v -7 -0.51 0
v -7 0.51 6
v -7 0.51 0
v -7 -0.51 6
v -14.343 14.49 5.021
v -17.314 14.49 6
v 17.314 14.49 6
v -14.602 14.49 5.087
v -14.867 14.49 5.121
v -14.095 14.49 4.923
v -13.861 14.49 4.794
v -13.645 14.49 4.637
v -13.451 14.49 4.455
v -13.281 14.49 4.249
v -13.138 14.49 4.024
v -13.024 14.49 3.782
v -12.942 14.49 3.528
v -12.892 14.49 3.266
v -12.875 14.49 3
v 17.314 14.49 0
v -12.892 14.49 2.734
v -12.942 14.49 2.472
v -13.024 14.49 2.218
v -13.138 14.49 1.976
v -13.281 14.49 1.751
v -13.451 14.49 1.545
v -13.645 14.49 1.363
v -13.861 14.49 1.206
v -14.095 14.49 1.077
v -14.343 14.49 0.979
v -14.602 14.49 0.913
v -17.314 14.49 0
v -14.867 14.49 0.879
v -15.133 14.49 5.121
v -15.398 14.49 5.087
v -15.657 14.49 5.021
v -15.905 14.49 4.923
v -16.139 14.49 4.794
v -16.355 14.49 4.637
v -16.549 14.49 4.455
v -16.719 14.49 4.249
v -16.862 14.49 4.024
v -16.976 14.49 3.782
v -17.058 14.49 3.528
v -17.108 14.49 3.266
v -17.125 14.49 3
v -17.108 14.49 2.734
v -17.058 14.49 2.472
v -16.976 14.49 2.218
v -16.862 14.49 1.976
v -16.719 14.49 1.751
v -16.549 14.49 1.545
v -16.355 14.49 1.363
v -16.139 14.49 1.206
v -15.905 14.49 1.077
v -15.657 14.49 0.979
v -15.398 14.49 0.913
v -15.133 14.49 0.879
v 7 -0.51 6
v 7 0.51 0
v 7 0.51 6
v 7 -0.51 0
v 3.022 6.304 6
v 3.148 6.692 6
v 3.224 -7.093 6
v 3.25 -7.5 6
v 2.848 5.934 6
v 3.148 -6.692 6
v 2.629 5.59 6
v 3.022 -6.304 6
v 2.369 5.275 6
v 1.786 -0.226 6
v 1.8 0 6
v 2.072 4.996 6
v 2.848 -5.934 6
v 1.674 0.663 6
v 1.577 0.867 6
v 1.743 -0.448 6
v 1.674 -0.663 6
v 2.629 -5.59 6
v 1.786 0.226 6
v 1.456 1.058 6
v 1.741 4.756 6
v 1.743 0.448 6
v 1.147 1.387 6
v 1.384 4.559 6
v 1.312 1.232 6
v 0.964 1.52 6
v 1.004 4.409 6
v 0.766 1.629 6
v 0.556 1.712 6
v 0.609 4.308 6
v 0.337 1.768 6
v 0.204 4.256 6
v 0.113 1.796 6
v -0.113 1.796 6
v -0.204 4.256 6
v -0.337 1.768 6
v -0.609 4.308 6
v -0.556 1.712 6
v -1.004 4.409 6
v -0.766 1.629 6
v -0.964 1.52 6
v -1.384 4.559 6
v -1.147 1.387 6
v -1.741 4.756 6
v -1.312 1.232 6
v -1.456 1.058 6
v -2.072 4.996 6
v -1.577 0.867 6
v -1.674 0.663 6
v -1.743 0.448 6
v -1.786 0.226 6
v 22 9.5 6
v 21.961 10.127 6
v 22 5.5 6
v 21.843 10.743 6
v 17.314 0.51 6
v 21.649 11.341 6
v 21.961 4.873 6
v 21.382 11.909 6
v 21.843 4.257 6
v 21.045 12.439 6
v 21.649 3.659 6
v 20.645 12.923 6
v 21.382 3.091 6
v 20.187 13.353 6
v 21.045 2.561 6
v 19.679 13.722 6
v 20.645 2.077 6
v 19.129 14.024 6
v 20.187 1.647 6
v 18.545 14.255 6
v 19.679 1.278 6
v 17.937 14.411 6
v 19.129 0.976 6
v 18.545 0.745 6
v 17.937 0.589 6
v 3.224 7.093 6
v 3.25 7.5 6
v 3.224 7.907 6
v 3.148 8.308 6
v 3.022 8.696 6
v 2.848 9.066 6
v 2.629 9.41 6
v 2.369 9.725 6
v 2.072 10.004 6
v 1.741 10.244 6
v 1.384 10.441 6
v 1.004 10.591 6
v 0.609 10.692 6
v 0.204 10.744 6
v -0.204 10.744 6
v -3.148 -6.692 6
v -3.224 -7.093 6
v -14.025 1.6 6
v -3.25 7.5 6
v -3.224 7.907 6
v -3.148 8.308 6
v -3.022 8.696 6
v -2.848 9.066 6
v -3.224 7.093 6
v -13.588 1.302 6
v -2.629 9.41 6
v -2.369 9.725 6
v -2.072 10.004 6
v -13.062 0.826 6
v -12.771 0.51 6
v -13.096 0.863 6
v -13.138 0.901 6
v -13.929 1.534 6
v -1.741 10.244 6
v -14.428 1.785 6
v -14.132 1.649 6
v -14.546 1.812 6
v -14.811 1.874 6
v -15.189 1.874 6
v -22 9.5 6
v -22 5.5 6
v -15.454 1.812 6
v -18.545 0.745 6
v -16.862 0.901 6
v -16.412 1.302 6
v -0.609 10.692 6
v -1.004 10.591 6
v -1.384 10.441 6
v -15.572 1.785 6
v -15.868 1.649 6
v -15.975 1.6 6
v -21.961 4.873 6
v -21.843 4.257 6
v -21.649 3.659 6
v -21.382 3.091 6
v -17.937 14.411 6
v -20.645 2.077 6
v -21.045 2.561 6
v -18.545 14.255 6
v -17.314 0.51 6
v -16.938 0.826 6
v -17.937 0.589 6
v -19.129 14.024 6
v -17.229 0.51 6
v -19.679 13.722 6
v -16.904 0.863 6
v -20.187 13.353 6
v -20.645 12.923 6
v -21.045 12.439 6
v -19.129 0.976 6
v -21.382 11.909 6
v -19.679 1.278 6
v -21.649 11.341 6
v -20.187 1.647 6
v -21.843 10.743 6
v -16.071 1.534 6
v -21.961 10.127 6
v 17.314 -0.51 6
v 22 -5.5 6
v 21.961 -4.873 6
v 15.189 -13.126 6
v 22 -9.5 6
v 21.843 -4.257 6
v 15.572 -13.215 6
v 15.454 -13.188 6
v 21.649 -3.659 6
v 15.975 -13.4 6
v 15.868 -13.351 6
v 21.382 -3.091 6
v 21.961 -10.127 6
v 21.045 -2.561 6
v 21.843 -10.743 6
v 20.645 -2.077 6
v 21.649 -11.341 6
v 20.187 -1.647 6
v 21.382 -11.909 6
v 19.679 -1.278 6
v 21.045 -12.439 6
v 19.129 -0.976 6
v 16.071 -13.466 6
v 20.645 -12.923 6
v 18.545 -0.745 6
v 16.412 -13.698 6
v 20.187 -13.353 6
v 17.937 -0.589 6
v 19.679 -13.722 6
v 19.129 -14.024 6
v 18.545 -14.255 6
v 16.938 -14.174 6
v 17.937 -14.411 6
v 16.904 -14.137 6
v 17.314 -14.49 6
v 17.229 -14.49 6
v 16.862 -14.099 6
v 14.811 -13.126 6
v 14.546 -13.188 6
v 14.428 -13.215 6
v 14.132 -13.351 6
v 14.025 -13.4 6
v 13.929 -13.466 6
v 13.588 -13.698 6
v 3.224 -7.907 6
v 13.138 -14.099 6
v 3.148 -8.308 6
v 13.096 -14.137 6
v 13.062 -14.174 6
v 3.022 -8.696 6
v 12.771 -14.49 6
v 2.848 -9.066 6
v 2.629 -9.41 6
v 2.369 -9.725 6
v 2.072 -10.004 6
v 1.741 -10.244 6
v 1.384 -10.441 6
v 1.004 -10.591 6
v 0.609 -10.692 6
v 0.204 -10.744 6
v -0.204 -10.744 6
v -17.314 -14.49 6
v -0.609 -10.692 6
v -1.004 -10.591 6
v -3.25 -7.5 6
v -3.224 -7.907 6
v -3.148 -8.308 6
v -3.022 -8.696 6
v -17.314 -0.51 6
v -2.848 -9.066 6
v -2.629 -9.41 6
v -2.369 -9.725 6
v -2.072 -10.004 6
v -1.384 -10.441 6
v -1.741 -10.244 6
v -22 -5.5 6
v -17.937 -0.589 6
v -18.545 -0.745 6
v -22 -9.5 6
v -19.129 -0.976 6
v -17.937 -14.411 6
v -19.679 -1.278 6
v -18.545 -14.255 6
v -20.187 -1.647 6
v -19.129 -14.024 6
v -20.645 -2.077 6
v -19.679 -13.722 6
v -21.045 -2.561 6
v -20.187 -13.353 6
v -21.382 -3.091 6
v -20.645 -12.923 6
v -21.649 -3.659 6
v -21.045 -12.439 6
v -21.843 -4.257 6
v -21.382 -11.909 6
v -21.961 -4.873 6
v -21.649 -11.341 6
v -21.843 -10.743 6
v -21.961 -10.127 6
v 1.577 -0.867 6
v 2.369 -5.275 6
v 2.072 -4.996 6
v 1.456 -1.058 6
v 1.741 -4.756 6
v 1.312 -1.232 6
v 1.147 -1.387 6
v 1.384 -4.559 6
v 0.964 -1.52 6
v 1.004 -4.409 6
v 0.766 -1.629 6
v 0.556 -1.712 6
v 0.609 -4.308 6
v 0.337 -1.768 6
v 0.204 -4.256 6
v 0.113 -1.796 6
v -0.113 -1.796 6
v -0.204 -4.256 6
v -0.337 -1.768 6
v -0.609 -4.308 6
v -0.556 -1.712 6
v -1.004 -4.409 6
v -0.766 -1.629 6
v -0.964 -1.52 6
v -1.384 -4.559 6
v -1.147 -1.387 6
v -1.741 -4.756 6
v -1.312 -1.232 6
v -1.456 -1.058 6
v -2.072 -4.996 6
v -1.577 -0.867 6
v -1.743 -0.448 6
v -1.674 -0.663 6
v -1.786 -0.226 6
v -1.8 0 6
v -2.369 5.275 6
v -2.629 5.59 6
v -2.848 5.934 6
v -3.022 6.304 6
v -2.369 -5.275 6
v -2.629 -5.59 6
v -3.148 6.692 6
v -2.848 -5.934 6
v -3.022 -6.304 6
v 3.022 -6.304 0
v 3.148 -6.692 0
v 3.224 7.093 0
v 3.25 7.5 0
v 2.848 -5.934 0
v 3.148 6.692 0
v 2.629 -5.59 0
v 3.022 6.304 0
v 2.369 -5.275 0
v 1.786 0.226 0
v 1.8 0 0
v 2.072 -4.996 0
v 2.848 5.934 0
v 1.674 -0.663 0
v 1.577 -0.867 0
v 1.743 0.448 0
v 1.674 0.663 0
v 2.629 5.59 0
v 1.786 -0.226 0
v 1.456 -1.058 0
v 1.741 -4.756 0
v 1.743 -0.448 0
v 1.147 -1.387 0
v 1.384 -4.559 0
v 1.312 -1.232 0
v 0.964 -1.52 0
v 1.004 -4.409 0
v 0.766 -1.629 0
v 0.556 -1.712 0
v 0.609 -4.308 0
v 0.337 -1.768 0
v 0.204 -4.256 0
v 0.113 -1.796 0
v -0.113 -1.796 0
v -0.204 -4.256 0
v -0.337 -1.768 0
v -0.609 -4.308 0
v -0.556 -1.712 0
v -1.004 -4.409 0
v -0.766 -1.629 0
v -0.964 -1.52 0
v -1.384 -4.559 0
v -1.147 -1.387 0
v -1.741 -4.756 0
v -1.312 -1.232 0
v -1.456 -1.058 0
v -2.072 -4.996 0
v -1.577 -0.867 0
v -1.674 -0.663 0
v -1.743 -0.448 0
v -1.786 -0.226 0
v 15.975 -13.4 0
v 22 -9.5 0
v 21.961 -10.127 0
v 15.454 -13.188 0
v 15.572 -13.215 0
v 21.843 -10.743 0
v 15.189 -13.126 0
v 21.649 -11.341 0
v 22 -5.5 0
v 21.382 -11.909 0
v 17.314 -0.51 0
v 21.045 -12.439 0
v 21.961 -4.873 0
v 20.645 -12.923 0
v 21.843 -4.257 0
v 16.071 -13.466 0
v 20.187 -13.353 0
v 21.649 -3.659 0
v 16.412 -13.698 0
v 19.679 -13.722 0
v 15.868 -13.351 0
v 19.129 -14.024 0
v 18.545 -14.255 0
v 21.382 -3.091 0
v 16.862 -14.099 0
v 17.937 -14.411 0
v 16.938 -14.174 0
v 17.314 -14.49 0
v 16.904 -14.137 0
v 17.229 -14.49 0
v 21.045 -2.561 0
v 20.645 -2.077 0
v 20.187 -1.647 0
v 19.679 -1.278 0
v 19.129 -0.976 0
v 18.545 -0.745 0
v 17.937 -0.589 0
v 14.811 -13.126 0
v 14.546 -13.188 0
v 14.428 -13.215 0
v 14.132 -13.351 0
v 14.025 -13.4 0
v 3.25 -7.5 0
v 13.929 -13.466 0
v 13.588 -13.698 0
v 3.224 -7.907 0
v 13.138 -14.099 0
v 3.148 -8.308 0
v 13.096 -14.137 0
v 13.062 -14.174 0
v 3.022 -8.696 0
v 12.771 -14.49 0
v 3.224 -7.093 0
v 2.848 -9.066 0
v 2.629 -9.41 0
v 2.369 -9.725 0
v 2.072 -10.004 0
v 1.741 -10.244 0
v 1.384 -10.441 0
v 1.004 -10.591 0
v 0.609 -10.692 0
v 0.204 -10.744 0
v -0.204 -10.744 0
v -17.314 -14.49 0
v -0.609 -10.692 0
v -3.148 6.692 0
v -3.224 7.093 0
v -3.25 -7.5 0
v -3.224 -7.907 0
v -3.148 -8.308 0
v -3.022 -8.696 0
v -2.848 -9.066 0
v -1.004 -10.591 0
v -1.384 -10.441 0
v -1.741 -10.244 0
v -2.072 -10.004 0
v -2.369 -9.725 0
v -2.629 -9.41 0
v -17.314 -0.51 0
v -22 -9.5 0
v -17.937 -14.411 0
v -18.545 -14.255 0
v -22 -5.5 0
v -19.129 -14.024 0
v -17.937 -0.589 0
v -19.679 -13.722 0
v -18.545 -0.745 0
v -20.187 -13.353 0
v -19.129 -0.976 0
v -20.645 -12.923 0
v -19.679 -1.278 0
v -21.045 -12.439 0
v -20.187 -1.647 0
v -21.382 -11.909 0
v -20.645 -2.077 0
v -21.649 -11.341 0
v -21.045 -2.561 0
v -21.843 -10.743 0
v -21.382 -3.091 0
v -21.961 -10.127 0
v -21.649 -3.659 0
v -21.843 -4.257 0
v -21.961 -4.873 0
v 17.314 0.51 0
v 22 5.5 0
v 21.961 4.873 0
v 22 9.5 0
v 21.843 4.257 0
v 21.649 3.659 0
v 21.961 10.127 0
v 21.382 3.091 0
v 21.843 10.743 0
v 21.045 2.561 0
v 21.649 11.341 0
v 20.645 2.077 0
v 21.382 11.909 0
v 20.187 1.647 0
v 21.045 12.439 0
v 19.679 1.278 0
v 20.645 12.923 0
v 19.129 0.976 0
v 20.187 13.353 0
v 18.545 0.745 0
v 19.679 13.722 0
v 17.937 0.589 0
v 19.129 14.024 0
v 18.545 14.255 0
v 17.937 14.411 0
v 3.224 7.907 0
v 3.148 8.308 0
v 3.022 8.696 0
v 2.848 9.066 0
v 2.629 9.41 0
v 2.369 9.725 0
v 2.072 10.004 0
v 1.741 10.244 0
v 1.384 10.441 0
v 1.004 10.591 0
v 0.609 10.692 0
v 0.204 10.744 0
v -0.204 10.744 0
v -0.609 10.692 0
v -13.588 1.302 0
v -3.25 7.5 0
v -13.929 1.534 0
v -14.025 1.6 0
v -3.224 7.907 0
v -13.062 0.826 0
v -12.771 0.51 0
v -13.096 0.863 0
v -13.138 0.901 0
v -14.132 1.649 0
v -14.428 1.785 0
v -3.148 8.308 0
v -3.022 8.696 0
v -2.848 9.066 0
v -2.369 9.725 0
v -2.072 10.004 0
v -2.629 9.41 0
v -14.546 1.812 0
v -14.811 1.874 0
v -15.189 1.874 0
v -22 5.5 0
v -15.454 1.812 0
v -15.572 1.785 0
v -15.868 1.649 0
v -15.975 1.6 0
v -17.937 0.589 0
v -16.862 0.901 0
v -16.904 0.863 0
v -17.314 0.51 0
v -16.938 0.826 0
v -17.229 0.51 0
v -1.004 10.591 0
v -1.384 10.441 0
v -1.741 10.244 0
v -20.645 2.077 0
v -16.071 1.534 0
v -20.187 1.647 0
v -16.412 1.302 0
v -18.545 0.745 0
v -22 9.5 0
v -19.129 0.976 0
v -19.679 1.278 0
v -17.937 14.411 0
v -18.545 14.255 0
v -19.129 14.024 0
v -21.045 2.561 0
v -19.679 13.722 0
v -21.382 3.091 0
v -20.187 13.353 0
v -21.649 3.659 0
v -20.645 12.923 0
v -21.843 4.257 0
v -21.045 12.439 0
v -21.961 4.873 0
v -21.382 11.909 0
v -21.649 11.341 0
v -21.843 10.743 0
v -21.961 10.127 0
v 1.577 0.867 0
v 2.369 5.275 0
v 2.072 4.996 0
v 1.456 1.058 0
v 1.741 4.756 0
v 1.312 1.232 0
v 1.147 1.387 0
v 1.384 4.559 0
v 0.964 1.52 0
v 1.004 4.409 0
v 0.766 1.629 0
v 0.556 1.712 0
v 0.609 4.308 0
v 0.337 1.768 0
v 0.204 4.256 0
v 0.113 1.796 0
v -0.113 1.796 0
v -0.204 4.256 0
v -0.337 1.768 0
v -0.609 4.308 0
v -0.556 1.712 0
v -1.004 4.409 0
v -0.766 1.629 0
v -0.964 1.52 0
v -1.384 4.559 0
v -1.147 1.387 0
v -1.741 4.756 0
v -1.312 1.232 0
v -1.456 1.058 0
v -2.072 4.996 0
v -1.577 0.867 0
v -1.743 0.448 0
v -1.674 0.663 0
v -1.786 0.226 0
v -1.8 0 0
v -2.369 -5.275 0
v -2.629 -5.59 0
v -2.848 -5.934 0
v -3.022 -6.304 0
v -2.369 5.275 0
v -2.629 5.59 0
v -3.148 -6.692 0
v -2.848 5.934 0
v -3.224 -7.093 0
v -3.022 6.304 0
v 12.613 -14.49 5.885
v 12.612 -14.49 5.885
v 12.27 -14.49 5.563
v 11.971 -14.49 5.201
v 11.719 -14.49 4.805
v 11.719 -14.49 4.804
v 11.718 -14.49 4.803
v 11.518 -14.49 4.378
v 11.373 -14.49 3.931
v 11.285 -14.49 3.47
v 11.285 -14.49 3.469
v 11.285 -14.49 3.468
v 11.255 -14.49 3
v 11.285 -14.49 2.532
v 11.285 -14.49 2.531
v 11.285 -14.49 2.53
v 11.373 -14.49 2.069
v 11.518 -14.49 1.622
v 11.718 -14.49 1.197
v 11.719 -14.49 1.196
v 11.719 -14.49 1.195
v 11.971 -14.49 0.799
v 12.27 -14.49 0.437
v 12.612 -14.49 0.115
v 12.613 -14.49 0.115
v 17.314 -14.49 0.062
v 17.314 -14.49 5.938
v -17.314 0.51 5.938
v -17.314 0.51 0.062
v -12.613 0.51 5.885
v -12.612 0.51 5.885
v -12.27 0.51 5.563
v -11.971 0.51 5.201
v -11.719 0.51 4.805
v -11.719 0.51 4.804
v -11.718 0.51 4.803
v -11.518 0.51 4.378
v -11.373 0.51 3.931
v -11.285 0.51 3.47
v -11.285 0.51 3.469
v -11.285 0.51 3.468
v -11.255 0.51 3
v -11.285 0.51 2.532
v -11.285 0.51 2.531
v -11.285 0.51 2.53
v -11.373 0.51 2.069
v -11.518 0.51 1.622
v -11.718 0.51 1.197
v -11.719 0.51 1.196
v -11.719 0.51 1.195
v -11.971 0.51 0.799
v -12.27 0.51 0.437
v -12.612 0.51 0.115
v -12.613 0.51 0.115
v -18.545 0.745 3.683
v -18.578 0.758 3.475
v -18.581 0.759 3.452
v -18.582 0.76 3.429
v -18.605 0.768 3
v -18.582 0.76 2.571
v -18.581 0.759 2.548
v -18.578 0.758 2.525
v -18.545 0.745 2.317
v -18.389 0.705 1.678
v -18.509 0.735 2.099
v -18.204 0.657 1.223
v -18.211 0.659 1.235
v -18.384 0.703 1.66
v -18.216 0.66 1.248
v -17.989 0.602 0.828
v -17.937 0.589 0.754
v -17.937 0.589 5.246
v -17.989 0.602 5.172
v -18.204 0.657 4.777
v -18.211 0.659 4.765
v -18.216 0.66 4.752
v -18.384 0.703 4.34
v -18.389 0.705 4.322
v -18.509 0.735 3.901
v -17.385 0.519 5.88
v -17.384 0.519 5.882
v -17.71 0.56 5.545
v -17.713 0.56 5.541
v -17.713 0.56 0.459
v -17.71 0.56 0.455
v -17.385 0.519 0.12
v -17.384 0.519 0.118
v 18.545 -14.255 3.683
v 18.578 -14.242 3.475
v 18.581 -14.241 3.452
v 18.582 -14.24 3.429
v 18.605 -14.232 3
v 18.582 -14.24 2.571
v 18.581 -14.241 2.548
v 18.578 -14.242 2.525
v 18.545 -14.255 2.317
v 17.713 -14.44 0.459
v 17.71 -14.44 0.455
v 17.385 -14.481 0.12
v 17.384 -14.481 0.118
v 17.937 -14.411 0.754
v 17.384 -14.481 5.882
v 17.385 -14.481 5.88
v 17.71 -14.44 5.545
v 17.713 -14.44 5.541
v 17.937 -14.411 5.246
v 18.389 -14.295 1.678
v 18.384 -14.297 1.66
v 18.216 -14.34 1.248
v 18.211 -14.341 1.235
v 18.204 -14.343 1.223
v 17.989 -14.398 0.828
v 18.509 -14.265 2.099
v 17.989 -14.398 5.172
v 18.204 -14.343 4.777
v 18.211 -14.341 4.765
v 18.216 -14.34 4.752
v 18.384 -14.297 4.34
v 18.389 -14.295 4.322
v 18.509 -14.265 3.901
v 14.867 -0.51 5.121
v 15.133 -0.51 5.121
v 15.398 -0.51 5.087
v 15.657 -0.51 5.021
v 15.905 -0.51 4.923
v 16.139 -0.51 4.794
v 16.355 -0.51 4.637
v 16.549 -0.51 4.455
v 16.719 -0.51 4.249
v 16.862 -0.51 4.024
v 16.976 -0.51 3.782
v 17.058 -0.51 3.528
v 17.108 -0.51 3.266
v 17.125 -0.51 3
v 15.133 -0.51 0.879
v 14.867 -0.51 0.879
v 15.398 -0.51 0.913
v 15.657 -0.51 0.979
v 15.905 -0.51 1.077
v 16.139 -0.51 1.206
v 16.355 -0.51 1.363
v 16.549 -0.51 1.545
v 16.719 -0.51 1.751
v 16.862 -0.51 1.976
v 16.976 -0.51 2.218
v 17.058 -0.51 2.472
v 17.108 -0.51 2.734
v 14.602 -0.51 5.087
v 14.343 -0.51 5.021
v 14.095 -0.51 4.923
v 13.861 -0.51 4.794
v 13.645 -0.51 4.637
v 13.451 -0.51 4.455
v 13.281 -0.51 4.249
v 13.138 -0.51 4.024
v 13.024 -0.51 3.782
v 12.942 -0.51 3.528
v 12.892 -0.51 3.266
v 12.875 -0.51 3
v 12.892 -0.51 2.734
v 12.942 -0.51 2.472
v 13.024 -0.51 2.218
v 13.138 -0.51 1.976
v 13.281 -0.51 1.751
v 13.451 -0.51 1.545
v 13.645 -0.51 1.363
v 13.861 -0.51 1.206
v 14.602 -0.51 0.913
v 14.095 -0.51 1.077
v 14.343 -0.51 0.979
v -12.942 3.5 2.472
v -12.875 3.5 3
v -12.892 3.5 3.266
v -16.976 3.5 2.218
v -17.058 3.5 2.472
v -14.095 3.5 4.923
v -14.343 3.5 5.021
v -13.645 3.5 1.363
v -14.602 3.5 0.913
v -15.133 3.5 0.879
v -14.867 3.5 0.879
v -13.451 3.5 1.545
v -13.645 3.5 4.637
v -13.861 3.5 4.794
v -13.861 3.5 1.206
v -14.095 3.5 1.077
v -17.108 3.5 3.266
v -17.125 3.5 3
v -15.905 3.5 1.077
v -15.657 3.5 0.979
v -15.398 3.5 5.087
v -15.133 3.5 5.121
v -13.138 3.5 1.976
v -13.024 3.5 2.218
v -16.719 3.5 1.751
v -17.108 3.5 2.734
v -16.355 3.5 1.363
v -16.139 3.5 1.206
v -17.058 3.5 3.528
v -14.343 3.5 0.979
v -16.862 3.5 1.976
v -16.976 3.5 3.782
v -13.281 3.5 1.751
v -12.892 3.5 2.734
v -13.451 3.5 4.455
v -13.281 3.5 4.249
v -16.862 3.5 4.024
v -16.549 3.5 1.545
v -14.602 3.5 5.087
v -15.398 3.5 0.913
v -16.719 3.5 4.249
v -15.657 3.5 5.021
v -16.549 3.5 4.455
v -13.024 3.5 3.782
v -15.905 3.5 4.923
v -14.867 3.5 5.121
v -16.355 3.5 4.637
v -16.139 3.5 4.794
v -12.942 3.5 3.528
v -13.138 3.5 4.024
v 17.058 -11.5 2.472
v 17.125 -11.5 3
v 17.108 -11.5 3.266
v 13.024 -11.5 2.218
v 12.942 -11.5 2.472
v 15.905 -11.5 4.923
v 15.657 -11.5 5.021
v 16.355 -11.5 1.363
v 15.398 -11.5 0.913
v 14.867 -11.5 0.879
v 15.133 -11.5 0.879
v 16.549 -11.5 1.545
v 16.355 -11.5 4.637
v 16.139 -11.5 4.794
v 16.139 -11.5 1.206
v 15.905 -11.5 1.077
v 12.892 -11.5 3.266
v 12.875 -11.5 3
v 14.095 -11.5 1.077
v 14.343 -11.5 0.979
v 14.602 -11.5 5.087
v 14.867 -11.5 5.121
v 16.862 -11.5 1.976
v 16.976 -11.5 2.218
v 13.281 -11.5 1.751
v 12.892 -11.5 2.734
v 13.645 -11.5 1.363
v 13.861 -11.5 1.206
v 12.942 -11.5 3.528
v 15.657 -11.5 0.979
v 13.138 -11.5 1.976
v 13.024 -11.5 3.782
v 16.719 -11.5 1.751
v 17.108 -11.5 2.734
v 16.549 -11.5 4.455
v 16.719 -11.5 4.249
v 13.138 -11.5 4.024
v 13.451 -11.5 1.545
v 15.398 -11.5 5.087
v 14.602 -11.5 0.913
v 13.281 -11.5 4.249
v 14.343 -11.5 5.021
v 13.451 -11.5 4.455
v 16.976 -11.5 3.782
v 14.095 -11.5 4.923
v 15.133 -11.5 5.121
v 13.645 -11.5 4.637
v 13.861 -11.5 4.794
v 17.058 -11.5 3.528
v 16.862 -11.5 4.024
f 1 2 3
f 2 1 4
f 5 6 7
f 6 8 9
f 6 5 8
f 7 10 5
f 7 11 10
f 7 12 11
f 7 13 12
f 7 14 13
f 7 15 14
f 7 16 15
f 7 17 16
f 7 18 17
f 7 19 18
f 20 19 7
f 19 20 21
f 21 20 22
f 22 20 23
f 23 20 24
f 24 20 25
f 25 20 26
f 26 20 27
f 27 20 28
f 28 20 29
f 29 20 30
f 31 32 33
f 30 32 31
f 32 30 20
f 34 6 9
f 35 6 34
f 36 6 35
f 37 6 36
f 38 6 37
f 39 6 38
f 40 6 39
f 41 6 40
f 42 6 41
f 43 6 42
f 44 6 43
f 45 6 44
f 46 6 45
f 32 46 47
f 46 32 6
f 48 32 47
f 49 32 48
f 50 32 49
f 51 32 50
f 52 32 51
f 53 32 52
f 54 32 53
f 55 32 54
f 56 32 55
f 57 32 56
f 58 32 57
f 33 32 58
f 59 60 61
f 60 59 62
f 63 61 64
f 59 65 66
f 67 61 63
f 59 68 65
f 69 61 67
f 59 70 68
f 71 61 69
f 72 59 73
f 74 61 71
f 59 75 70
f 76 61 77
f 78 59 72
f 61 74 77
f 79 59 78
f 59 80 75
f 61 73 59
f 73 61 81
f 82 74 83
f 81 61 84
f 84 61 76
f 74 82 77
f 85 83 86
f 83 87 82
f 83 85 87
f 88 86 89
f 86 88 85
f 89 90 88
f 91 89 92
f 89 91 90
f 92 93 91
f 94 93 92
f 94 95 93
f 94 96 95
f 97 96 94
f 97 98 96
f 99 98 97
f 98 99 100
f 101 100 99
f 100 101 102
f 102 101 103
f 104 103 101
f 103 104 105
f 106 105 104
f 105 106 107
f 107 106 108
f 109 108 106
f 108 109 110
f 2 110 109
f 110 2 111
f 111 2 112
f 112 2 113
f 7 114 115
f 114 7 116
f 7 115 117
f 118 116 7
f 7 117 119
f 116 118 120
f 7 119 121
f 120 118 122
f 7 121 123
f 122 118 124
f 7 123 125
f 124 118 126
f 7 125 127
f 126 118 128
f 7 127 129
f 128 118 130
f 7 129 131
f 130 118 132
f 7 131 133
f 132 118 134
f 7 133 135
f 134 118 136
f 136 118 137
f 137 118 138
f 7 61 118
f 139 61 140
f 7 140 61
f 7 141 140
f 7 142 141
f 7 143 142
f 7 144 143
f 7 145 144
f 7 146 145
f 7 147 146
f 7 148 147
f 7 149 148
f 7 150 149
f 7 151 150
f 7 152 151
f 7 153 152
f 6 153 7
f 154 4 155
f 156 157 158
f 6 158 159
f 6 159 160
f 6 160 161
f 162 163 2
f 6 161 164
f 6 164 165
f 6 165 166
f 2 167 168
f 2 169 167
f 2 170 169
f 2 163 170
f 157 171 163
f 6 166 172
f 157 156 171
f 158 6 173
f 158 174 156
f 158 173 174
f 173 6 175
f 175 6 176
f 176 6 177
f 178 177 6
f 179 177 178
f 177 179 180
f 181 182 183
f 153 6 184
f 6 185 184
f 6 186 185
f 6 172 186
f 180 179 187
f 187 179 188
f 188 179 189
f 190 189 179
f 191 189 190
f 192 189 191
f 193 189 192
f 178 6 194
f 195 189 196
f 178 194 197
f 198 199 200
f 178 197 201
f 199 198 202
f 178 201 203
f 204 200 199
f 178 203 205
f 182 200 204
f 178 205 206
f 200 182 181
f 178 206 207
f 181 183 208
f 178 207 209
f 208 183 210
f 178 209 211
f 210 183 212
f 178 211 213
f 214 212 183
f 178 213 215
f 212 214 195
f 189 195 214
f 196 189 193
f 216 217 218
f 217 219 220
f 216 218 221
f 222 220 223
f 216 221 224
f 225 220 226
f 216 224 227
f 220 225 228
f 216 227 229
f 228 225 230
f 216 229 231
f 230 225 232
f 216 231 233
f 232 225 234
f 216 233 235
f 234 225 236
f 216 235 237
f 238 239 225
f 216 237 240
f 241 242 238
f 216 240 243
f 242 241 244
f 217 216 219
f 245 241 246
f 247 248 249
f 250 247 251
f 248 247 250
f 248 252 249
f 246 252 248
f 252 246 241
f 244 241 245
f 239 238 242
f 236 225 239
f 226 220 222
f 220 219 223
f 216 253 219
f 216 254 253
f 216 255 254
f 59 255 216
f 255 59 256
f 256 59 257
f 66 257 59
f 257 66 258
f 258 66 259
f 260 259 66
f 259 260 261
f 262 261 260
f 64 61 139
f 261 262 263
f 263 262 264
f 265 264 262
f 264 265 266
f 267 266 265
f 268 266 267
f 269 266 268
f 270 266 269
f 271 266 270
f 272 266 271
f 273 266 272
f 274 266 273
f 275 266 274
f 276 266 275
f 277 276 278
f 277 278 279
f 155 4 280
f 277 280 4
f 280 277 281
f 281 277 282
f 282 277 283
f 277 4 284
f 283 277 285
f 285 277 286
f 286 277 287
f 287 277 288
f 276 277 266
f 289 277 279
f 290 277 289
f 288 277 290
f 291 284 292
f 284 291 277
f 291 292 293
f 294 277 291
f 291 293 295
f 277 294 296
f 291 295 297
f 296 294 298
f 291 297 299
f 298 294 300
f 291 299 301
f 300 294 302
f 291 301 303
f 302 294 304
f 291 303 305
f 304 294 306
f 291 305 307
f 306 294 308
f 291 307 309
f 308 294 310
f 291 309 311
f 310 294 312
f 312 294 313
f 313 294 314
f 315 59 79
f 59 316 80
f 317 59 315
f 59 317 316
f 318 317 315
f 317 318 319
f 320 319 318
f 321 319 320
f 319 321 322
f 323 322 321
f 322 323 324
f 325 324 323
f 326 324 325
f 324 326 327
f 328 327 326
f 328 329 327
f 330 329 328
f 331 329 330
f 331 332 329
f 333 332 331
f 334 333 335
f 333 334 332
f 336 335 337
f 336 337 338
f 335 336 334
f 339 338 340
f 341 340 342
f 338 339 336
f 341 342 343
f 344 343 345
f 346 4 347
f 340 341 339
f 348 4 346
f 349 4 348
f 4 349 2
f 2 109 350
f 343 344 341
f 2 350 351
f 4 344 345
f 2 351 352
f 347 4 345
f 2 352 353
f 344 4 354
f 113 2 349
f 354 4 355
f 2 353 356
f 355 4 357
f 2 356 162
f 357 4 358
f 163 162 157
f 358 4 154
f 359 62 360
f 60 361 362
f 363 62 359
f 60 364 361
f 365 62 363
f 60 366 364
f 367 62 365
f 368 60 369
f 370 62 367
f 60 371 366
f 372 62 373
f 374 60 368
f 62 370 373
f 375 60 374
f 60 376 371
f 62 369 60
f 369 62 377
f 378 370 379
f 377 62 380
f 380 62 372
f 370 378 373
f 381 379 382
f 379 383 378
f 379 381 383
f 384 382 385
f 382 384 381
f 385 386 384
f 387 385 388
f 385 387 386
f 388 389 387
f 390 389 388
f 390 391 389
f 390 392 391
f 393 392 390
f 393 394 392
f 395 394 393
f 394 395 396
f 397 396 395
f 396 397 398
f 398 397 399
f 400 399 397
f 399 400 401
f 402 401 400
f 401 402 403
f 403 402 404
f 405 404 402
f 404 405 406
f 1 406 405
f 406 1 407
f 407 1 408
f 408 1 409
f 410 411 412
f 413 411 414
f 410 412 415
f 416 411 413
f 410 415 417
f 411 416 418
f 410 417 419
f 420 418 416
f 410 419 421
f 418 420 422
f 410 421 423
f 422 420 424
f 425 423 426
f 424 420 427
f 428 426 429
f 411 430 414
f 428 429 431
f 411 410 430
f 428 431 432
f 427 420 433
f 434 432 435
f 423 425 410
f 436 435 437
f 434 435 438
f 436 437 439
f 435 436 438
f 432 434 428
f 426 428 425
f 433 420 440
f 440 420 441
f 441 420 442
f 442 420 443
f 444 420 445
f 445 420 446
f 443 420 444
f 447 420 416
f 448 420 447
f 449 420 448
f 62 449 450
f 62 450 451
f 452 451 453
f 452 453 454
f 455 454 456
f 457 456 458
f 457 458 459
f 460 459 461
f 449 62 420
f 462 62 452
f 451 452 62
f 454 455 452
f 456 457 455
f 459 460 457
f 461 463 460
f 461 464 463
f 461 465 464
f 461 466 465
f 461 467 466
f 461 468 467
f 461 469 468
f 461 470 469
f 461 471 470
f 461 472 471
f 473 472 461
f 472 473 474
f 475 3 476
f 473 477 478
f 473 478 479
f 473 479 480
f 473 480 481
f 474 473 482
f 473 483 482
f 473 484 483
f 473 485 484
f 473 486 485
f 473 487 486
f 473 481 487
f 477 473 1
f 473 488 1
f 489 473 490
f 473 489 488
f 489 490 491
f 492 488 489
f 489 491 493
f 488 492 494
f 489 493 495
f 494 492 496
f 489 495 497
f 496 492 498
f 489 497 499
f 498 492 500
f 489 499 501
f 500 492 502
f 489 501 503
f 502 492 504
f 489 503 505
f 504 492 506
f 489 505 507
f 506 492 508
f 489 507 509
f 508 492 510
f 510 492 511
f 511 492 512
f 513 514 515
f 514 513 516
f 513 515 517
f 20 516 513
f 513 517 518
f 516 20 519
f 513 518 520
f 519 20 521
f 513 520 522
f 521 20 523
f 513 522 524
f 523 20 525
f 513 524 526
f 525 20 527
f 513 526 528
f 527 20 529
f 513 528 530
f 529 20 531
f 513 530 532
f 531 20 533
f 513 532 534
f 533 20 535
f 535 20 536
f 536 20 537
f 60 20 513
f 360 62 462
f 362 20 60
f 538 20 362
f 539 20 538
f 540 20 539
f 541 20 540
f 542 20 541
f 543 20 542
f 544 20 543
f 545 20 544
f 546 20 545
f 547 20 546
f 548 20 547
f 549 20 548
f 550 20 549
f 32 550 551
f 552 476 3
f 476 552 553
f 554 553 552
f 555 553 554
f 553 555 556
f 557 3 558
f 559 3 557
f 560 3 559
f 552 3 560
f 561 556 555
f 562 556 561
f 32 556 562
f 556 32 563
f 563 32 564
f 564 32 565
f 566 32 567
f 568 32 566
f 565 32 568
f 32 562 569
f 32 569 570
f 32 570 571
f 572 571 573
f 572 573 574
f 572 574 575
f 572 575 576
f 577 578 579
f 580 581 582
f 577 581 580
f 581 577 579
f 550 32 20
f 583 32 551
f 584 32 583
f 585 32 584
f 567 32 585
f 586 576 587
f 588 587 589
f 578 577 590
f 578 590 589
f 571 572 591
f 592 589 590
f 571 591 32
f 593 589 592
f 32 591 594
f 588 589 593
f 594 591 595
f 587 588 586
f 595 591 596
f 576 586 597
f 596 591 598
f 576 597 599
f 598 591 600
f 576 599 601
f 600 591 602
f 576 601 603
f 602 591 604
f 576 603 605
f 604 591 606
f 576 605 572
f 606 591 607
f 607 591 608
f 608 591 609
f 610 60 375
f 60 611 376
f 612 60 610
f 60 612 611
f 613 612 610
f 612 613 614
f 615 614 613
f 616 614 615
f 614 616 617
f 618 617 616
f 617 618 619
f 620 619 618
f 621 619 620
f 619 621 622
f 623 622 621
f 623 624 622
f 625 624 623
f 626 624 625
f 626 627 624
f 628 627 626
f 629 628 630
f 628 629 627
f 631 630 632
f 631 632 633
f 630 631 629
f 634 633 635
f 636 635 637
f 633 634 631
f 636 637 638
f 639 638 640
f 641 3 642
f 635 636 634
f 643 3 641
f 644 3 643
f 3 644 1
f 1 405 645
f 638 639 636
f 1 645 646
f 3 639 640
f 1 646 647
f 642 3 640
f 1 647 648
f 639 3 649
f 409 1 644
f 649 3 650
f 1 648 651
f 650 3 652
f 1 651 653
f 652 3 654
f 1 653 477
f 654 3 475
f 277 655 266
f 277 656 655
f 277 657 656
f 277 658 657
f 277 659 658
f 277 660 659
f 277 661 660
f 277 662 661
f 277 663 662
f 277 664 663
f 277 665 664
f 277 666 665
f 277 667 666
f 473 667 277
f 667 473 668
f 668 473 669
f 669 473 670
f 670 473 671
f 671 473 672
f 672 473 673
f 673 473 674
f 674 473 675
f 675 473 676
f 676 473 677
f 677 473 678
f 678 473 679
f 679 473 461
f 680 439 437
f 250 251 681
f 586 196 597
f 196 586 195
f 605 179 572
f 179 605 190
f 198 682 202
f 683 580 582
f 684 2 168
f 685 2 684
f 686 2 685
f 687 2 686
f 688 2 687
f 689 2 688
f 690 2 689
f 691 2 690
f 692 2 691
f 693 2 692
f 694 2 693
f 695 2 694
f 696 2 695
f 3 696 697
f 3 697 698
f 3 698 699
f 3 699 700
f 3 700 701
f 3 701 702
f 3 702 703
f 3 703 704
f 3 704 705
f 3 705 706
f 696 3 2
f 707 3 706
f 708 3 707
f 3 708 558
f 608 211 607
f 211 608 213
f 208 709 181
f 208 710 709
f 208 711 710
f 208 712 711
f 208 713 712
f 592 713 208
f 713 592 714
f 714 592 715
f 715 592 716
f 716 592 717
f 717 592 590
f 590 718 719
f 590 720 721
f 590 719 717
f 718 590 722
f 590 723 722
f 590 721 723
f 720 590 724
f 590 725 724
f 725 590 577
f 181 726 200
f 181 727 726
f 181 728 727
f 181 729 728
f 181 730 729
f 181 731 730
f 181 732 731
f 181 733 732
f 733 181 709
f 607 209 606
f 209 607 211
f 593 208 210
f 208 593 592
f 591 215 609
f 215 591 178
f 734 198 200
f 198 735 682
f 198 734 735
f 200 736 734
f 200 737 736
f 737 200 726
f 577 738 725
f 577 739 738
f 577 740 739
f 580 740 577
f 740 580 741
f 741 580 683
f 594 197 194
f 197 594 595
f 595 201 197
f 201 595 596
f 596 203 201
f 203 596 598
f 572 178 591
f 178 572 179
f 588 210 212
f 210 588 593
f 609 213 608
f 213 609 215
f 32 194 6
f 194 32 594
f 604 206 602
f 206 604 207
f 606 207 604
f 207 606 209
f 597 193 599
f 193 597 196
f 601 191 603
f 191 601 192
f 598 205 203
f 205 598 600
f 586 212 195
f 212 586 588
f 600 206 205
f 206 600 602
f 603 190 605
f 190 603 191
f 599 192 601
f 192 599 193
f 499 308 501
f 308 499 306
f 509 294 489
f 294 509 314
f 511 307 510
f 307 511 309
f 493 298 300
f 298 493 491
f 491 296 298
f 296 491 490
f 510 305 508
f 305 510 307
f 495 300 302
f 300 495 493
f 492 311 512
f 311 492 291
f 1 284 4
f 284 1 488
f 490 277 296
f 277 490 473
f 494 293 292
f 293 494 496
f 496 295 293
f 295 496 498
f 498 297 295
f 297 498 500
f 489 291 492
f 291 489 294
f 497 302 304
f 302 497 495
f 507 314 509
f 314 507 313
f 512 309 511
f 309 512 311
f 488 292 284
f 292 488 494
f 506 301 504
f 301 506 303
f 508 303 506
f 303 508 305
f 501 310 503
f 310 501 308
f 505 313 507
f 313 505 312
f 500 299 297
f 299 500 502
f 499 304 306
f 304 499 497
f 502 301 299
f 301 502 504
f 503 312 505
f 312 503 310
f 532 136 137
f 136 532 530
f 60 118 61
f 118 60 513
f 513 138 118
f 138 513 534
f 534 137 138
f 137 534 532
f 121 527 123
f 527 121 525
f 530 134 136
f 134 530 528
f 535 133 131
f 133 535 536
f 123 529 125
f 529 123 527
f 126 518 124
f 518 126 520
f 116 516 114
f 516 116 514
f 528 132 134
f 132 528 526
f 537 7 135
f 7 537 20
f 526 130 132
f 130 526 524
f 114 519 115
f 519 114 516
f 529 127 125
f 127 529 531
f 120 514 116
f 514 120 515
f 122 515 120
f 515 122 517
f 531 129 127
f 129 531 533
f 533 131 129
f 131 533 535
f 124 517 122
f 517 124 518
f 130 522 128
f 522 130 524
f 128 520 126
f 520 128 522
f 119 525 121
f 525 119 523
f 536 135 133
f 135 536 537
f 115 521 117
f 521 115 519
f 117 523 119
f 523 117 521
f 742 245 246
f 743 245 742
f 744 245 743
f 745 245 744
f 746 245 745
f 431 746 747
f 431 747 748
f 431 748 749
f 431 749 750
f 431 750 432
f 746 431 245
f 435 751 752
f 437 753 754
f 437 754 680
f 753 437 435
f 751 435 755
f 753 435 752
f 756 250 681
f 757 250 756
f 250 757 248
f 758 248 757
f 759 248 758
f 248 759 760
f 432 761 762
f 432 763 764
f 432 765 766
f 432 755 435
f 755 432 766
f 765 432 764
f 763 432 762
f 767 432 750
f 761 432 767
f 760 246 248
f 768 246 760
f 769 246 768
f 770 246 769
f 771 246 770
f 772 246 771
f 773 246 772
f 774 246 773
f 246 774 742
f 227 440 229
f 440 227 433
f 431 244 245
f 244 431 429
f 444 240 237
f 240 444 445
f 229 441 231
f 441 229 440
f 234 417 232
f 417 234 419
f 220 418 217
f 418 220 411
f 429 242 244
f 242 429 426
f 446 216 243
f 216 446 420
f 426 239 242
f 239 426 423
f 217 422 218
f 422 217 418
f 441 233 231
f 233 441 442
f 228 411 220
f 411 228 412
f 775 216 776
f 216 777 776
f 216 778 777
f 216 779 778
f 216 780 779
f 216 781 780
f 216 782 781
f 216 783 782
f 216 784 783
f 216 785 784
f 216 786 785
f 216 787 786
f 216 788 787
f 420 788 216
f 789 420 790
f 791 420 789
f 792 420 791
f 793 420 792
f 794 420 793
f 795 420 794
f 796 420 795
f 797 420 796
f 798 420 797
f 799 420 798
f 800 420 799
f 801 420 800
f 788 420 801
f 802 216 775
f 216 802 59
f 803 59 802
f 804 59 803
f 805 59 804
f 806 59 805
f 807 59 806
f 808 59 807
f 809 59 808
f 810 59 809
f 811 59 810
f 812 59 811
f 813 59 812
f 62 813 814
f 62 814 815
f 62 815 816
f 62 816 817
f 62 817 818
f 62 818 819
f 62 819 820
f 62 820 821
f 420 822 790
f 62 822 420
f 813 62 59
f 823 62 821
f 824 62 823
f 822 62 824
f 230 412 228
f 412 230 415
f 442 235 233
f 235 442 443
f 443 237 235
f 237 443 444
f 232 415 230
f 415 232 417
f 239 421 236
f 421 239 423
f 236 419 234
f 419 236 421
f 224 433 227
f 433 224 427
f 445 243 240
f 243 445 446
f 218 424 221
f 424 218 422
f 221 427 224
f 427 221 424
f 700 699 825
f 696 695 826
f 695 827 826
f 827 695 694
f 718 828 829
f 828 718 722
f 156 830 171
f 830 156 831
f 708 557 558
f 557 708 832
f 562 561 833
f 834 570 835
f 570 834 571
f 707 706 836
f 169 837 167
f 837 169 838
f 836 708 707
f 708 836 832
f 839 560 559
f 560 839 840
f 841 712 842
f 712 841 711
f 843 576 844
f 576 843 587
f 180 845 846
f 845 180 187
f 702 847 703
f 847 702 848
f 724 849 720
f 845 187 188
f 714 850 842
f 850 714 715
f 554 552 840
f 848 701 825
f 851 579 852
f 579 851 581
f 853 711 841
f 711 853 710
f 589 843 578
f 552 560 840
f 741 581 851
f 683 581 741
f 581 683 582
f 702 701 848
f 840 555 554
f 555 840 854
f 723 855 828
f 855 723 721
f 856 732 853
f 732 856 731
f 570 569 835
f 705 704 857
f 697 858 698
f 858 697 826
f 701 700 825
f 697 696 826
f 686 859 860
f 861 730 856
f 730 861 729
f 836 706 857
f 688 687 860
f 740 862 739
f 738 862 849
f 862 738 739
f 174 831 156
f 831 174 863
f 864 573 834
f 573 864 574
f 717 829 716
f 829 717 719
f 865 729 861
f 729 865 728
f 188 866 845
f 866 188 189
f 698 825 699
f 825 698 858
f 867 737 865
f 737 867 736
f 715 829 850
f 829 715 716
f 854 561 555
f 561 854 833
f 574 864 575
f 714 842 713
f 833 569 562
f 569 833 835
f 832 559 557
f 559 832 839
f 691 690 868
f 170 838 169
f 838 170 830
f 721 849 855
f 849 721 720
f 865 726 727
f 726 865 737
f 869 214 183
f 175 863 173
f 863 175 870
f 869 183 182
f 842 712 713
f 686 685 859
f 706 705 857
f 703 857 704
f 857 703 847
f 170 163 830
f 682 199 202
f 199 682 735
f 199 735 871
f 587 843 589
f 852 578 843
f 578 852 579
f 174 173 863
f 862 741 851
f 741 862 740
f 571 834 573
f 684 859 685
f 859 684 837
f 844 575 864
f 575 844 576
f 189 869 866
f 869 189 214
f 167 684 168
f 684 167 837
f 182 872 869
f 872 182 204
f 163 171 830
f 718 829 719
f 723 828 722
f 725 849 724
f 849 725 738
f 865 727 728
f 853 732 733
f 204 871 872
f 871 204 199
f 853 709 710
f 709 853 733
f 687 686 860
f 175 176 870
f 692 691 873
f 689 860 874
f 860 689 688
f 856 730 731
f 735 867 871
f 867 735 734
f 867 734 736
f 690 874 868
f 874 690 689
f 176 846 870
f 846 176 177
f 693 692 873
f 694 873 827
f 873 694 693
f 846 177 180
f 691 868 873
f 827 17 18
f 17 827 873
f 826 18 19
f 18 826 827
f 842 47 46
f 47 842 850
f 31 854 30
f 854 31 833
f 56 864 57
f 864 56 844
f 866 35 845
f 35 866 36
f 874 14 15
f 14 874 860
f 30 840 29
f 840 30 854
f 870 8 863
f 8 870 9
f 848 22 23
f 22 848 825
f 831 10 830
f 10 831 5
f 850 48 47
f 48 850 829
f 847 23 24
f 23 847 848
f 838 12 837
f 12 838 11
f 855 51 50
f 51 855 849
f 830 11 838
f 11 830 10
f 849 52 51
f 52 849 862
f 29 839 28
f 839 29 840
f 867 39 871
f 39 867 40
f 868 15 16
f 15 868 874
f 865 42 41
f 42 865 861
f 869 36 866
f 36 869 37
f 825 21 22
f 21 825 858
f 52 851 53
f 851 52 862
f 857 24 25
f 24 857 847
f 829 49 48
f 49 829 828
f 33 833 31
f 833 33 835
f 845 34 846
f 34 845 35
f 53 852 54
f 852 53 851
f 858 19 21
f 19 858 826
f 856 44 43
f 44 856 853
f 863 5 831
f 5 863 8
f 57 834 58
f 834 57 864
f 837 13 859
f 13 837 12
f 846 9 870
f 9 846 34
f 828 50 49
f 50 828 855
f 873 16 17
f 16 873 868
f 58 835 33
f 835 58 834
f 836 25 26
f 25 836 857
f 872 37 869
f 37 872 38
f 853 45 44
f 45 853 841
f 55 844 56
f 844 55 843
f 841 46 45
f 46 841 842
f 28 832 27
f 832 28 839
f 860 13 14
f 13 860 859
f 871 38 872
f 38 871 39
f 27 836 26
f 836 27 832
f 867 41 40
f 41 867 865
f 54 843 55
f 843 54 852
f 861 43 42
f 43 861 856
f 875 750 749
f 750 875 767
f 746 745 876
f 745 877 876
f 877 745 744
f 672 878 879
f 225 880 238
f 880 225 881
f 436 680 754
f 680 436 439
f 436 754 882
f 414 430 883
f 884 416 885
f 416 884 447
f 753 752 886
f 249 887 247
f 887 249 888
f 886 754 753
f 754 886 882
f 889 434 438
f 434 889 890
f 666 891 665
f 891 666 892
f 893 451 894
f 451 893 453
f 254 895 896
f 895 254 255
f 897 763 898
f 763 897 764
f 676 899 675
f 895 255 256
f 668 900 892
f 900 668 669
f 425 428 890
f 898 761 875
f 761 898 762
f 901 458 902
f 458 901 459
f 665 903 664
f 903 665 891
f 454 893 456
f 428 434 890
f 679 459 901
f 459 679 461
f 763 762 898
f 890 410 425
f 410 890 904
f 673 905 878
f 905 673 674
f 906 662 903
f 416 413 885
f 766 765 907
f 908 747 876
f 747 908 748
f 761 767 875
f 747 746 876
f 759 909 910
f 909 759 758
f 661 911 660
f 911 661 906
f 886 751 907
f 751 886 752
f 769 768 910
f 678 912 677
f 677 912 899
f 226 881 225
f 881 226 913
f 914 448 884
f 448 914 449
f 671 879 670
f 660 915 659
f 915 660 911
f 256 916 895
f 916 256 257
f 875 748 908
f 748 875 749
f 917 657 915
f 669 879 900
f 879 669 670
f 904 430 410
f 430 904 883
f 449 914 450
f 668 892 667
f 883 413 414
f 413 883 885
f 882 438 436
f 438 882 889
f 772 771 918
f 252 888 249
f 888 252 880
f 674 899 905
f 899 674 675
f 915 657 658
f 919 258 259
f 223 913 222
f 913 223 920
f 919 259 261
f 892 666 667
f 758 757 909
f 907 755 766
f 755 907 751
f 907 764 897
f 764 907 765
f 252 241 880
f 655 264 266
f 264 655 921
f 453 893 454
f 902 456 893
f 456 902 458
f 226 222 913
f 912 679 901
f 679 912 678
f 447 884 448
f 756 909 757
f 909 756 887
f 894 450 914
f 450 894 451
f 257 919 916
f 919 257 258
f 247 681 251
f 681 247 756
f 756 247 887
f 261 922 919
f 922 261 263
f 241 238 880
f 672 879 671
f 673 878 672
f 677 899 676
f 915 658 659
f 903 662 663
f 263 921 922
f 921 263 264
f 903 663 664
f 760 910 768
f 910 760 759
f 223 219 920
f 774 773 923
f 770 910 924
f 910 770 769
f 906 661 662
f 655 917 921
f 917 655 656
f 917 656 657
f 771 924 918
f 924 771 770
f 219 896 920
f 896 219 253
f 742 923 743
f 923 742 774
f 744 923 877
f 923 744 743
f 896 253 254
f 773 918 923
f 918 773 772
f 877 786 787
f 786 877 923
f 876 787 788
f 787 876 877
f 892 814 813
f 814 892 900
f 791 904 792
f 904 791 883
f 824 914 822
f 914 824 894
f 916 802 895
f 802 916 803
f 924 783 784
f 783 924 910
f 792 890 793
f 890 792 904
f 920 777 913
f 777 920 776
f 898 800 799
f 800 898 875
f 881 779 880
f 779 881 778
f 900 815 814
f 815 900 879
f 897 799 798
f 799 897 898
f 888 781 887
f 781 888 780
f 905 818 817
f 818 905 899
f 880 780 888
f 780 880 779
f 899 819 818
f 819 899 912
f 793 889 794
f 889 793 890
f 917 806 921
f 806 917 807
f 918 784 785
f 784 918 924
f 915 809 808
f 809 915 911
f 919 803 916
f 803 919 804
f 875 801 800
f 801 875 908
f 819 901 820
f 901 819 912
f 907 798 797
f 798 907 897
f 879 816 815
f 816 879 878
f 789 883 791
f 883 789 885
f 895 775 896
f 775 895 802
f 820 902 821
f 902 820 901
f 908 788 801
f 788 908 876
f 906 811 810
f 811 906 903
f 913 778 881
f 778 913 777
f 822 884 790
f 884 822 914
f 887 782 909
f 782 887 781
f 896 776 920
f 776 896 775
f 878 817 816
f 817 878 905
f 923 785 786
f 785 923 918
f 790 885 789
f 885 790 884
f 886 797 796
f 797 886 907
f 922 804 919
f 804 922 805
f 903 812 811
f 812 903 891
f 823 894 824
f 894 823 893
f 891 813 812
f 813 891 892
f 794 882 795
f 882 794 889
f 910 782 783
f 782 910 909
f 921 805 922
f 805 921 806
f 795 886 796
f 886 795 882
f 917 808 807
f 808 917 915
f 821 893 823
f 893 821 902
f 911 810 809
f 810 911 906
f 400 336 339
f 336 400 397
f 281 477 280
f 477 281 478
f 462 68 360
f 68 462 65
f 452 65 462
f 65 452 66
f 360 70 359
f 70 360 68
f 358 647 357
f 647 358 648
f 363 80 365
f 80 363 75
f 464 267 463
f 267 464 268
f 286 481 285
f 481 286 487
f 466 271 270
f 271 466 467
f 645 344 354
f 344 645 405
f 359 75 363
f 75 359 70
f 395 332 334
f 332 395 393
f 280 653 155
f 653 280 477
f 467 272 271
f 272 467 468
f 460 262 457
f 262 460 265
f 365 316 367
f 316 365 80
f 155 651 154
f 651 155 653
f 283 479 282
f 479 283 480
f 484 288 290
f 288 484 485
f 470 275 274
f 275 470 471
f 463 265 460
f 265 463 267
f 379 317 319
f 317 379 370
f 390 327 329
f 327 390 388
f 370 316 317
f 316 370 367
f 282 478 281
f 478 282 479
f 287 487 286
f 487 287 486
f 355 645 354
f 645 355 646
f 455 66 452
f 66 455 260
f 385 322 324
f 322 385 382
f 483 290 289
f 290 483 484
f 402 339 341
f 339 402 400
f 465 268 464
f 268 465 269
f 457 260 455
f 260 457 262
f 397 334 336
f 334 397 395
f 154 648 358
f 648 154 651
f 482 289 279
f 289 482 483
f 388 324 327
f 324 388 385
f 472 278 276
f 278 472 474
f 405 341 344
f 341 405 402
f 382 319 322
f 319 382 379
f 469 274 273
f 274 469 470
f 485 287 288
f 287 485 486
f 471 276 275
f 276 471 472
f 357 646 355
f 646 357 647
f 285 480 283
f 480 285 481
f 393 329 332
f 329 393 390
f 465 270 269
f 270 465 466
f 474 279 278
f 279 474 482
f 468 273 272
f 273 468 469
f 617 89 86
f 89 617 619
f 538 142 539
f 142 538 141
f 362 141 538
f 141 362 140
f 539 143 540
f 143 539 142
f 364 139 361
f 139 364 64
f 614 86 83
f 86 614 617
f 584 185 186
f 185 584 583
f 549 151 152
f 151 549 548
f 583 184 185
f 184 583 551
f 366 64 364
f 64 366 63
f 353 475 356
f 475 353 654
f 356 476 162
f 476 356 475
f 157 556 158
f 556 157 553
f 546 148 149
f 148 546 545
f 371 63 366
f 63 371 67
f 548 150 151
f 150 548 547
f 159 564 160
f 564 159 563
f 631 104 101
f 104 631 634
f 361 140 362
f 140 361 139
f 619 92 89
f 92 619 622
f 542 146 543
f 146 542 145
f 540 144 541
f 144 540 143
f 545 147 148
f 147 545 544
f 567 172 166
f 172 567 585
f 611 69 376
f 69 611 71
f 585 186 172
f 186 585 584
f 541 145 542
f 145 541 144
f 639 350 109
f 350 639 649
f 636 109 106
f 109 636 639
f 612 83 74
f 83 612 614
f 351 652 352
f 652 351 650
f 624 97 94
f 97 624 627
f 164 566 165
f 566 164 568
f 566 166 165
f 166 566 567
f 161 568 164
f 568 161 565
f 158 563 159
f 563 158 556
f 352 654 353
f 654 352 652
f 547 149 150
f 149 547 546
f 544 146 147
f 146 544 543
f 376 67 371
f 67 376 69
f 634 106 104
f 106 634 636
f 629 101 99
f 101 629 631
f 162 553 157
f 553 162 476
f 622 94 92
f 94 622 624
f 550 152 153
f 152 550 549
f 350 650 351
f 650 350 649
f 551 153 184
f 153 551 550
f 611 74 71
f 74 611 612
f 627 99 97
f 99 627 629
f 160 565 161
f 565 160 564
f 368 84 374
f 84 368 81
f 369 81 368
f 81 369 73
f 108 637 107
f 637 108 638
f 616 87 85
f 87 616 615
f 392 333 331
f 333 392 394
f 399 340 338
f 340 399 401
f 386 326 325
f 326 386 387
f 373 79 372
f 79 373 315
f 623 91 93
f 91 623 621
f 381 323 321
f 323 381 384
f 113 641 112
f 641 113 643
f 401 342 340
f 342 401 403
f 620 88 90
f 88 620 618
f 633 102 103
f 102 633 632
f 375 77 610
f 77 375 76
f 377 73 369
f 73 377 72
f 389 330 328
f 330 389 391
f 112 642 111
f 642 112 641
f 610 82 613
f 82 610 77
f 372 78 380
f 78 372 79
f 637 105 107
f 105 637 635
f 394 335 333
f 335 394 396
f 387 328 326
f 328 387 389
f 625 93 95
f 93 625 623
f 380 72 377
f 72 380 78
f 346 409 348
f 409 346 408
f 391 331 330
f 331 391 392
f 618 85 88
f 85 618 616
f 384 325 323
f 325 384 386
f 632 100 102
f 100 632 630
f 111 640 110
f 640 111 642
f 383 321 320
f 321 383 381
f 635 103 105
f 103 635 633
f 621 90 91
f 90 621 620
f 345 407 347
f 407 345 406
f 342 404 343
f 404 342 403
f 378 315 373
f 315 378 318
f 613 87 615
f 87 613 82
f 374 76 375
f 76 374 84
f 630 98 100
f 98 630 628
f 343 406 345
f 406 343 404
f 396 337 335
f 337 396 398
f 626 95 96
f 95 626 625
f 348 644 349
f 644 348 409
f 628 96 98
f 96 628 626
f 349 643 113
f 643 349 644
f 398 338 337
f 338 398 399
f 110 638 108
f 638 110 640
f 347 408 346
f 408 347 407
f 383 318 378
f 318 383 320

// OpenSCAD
$fn = 50;


difference() {
	union() {
		hull() {
			translate(v = [-2.0000000000, 9.5000000000, 0]) {
				cylinder(h = 6, r = 5);
			}
			translate(v = [2.0000000000, 9.5000000000, 0]) {
				cylinder(h = 6, r = 5);
			}
			translate(v = [-2.0000000000, -9.5000000000, 0]) {
				cylinder(h = 6, r = 5);
			}
			translate(v = [2.0000000000, -9.5000000000, 0]) {
				cylinder(h = 6, r = 5);
			}
		}
		translate(v = [-7.5000000000, 7.5000000000, 0]) {
			hull() {
				translate(v = [-9.5000000000, 2.0000000000, 0]) {
					cylinder(h = 6, r = 5);
				}
				translate(v = [9.5000000000, 2.0000000000, 0]) {
					cylinder(h = 6, r = 5);
				}
				translate(v = [-9.5000000000, -2.0000000000, 0]) {
					cylinder(h = 6, r = 5);
				}
				translate(v = [9.5000000000, -2.0000000000, 0]) {
					cylinder(h = 6, r = 5);
				}
			}
		}
		translate(v = [-7.5000000000, -7.5000000000, 0]) {
			hull() {
				translate(v = [-9.5000000000, 2.0000000000, 0]) {
					cylinder(h = 6, r = 5);
				}
				translate(v = [9.5000000000, 2.0000000000, 0]) {
					cylinder(h = 6, r = 5);
				}
				translate(v = [-9.5000000000, -2.0000000000, 0]) {
					cylinder(h = 6, r = 5);
				}
				translate(v = [9.5000000000, -2.0000000000, 0]) {
					cylinder(h = 6, r = 5);
				}
			}
		}
		translate(v = [7.5000000000, 7.5000000000, 0]) {
			hull() {
				translate(v = [-9.5000000000, 2.0000000000, 0]) {
					cylinder(h = 6, r = 5);
				}
				translate(v = [9.5000000000, 2.0000000000, 0]) {
					cylinder(h = 6, r = 5);
				}
				translate(v = [-9.5000000000, -2.0000000000, 0]) {
					cylinder(h = 6, r = 5);
				}
				translate(v = [9.5000000000, -2.0000000000, 0]) {
					cylinder(h = 6, r = 5);
				}
			}
		}
		translate(v = [7.5000000000, -7.5000000000, 0]) {
			hull() {
				translate(v = [-9.5000000000, 2.0000000000, 0]) {
					cylinder(h = 6, r = 5);
				}
				translate(v = [9.5000000000, 2.0000000000, 0]) {
					cylinder(h = 6, r = 5);
				}
				translate(v = [-9.5000000000, -2.0000000000, 0]) {
					cylinder(h = 6, r = 5);
				}
				translate(v = [9.5000000000, -2.0000000000, 0]) {
					cylinder(h = 6, r = 5);
				}
			}
		}
	}
	union() {
		translate(v = [-15.0000000000, 0.5000000000, 3.0000000000]) {
			rotate(a = [90, 0, 0]) {
				difference() {
					union() {
						#translate(v = [0, 0, -14.0000000000]) {
							cylinder(h = 14, r = 2.0000000000);
						}
						#translate(v = [0, 0, -3]) {
							cylinder(h = 3, r1 = 2.1250000000, r2 = 3.7500000000);
						}
						#translate(v = [0, 0, -14.0000000000]) {
							cylinder(h = 14, r = 2.1250000000);
						}
						#translate(v = [0, 0, -14.0000000000]) {
							cylinder(h = 14, r = 2.0000000000);
						}
					}
					union();
				}
			}
		}
		translate(v = [15.0000000000, -14.5000000000, 3.0000000000]) {
			rotate(a = [90, 0, 0]) {
				difference() {
					union() {
						#translate(v = [0, 0, -14.0000000000]) {
							cylinder(h = 14, r = 2.0000000000);
						}
						#translate(v = [0, 0, -3]) {
							cylinder(h = 3, r1 = 2.1250000000, r2 = 3.7500000000);
						}
						#translate(v = [0, 0, -14.0000000000]) {
							cylinder(h = 14, r = 2.1250000000);
						}
						#translate(v = [0, 0, -14.0000000000]) {
							cylinder(h = 14, r = 2.0000000000);
						}
					}
					union();
				}
			}
		}
		translate(v = [0.0000000000, -7.5000000000, 0]) {
			translate(v = [0, 0, -100]) {
				cylinder(h = 200, r = 3.2500000000);
			}
		}
		translate(v = [0.0000000000, 7.5000000000, 0]) {
			translate(v = [0, 0, -100]) {
				cylinder(h = 200, r = 3.2500000000);
			}
		}
		translate(v = [0.0000000000, -7.5000000000, 0]) {
			translate(v = [0, 0, -100]) {
				cylinder(h = 200, r = 1.8000000000);
			}
		}
		translate(v = [0, 0, -100]) {
			cylinder(h = 200, r = 1.8000000000);
		}
		translate(v = [0.0000000000, 7.5000000000, 0]) {
			translate(v = [0, 0, -100]) {
				cylinder(h = 200, r = 1.8000000000);
			}
		}
	}
}
